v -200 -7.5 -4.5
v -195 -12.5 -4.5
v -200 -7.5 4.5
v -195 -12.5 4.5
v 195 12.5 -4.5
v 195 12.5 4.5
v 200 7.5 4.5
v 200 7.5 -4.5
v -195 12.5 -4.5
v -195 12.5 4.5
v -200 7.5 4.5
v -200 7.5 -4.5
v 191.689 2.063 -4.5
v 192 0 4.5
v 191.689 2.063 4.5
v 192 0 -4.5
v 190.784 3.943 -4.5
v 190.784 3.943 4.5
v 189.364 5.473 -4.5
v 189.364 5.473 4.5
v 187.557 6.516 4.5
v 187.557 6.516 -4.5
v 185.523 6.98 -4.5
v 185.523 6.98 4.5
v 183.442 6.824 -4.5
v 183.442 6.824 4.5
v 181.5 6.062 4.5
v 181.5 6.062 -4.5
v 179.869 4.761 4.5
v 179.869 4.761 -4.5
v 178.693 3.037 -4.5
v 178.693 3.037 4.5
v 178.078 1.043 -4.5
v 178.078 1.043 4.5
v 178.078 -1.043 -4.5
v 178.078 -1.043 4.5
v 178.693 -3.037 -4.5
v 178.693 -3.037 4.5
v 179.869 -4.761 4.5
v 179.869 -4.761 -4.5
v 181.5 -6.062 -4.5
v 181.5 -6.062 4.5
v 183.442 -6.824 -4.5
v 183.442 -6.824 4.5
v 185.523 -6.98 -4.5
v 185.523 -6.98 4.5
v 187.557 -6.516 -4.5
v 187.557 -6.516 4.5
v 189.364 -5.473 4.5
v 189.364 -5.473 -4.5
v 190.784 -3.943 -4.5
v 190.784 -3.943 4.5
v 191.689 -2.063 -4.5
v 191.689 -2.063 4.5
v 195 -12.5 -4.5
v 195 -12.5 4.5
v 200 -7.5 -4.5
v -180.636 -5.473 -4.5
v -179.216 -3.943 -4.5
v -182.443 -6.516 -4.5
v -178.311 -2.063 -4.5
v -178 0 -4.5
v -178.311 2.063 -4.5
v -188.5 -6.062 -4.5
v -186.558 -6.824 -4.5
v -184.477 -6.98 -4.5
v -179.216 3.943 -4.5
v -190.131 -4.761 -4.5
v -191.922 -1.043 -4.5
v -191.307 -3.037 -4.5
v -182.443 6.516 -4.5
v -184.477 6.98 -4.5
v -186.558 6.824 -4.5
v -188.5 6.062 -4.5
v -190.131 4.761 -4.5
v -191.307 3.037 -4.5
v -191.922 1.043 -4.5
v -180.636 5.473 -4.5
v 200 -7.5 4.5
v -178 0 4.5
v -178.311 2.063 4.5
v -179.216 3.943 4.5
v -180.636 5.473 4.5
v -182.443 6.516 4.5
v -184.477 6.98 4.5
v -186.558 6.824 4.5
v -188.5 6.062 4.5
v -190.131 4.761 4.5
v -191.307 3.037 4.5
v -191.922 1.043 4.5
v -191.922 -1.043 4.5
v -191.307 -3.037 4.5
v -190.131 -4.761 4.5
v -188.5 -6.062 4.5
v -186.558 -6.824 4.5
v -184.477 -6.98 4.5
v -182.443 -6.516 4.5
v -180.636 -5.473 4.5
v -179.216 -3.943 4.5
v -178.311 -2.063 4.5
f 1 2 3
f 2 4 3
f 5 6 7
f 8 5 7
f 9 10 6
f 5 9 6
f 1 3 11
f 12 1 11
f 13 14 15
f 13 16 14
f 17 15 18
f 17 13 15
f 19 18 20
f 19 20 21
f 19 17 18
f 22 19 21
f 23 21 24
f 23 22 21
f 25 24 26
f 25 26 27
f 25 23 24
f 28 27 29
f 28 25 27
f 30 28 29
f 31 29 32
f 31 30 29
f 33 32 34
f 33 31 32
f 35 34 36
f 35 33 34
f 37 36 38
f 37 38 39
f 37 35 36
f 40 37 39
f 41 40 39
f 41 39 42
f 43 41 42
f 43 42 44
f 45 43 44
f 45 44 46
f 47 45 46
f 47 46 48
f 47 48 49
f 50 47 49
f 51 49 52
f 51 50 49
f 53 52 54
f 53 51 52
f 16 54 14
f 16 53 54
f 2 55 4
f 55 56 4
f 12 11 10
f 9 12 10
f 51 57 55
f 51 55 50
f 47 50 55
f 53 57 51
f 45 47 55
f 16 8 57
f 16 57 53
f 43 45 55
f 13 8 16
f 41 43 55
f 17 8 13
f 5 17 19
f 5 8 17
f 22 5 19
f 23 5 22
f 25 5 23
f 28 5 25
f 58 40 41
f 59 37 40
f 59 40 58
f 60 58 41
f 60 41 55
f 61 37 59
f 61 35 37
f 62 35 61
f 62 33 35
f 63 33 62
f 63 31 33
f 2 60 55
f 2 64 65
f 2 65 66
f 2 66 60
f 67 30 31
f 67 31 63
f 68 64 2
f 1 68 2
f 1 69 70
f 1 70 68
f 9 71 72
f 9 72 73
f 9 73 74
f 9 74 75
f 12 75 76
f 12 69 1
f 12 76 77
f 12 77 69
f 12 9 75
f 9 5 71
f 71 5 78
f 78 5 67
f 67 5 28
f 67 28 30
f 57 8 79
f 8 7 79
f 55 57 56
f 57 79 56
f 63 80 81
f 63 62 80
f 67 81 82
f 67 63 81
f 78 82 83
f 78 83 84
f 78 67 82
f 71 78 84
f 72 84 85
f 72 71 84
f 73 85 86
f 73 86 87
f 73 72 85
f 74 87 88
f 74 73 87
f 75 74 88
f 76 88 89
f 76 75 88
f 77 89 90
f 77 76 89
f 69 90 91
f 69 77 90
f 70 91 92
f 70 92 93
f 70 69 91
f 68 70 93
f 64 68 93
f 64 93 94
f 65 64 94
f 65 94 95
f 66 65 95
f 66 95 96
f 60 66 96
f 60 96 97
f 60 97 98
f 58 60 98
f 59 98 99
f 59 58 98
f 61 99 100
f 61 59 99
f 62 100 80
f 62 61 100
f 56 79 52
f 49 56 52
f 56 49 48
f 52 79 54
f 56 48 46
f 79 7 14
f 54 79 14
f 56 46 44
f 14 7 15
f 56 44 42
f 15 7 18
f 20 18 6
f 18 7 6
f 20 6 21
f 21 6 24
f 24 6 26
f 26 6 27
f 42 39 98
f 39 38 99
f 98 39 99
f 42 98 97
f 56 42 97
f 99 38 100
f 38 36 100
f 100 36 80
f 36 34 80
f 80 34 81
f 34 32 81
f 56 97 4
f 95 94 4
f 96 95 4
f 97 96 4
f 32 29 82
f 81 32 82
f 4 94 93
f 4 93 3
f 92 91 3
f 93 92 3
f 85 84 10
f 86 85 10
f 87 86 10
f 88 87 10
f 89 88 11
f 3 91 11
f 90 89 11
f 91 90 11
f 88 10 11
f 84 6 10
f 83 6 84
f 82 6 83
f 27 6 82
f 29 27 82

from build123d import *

# Parameters (mm, degrees)
SKETCH_1_R      = 7
EXTRUDE_1_DEPTH = 4.5


with BuildPart() as part:
    # 草圖1 → 填料-伸長1 (new body, symmetric)
    with BuildSketch(Plane.XY):
        Polygon((195, 12.5), (200, 7.5), (200, -7.5), (195, -12.5), (-195, -12.5), (-200, -7.5), (-200, 7.5), (-195, 12.5), align=None)
        with Locations((185, 0)):
            Circle(SKETCH_1_R, mode=Mode.SUBTRACT)
        with Locations((-185, 0)):
            Circle(SKETCH_1_R, mode=Mode.SUBTRACT)
    extrude(amount=EXTRUDE_1_DEPTH, both=True)


solid = part.part
